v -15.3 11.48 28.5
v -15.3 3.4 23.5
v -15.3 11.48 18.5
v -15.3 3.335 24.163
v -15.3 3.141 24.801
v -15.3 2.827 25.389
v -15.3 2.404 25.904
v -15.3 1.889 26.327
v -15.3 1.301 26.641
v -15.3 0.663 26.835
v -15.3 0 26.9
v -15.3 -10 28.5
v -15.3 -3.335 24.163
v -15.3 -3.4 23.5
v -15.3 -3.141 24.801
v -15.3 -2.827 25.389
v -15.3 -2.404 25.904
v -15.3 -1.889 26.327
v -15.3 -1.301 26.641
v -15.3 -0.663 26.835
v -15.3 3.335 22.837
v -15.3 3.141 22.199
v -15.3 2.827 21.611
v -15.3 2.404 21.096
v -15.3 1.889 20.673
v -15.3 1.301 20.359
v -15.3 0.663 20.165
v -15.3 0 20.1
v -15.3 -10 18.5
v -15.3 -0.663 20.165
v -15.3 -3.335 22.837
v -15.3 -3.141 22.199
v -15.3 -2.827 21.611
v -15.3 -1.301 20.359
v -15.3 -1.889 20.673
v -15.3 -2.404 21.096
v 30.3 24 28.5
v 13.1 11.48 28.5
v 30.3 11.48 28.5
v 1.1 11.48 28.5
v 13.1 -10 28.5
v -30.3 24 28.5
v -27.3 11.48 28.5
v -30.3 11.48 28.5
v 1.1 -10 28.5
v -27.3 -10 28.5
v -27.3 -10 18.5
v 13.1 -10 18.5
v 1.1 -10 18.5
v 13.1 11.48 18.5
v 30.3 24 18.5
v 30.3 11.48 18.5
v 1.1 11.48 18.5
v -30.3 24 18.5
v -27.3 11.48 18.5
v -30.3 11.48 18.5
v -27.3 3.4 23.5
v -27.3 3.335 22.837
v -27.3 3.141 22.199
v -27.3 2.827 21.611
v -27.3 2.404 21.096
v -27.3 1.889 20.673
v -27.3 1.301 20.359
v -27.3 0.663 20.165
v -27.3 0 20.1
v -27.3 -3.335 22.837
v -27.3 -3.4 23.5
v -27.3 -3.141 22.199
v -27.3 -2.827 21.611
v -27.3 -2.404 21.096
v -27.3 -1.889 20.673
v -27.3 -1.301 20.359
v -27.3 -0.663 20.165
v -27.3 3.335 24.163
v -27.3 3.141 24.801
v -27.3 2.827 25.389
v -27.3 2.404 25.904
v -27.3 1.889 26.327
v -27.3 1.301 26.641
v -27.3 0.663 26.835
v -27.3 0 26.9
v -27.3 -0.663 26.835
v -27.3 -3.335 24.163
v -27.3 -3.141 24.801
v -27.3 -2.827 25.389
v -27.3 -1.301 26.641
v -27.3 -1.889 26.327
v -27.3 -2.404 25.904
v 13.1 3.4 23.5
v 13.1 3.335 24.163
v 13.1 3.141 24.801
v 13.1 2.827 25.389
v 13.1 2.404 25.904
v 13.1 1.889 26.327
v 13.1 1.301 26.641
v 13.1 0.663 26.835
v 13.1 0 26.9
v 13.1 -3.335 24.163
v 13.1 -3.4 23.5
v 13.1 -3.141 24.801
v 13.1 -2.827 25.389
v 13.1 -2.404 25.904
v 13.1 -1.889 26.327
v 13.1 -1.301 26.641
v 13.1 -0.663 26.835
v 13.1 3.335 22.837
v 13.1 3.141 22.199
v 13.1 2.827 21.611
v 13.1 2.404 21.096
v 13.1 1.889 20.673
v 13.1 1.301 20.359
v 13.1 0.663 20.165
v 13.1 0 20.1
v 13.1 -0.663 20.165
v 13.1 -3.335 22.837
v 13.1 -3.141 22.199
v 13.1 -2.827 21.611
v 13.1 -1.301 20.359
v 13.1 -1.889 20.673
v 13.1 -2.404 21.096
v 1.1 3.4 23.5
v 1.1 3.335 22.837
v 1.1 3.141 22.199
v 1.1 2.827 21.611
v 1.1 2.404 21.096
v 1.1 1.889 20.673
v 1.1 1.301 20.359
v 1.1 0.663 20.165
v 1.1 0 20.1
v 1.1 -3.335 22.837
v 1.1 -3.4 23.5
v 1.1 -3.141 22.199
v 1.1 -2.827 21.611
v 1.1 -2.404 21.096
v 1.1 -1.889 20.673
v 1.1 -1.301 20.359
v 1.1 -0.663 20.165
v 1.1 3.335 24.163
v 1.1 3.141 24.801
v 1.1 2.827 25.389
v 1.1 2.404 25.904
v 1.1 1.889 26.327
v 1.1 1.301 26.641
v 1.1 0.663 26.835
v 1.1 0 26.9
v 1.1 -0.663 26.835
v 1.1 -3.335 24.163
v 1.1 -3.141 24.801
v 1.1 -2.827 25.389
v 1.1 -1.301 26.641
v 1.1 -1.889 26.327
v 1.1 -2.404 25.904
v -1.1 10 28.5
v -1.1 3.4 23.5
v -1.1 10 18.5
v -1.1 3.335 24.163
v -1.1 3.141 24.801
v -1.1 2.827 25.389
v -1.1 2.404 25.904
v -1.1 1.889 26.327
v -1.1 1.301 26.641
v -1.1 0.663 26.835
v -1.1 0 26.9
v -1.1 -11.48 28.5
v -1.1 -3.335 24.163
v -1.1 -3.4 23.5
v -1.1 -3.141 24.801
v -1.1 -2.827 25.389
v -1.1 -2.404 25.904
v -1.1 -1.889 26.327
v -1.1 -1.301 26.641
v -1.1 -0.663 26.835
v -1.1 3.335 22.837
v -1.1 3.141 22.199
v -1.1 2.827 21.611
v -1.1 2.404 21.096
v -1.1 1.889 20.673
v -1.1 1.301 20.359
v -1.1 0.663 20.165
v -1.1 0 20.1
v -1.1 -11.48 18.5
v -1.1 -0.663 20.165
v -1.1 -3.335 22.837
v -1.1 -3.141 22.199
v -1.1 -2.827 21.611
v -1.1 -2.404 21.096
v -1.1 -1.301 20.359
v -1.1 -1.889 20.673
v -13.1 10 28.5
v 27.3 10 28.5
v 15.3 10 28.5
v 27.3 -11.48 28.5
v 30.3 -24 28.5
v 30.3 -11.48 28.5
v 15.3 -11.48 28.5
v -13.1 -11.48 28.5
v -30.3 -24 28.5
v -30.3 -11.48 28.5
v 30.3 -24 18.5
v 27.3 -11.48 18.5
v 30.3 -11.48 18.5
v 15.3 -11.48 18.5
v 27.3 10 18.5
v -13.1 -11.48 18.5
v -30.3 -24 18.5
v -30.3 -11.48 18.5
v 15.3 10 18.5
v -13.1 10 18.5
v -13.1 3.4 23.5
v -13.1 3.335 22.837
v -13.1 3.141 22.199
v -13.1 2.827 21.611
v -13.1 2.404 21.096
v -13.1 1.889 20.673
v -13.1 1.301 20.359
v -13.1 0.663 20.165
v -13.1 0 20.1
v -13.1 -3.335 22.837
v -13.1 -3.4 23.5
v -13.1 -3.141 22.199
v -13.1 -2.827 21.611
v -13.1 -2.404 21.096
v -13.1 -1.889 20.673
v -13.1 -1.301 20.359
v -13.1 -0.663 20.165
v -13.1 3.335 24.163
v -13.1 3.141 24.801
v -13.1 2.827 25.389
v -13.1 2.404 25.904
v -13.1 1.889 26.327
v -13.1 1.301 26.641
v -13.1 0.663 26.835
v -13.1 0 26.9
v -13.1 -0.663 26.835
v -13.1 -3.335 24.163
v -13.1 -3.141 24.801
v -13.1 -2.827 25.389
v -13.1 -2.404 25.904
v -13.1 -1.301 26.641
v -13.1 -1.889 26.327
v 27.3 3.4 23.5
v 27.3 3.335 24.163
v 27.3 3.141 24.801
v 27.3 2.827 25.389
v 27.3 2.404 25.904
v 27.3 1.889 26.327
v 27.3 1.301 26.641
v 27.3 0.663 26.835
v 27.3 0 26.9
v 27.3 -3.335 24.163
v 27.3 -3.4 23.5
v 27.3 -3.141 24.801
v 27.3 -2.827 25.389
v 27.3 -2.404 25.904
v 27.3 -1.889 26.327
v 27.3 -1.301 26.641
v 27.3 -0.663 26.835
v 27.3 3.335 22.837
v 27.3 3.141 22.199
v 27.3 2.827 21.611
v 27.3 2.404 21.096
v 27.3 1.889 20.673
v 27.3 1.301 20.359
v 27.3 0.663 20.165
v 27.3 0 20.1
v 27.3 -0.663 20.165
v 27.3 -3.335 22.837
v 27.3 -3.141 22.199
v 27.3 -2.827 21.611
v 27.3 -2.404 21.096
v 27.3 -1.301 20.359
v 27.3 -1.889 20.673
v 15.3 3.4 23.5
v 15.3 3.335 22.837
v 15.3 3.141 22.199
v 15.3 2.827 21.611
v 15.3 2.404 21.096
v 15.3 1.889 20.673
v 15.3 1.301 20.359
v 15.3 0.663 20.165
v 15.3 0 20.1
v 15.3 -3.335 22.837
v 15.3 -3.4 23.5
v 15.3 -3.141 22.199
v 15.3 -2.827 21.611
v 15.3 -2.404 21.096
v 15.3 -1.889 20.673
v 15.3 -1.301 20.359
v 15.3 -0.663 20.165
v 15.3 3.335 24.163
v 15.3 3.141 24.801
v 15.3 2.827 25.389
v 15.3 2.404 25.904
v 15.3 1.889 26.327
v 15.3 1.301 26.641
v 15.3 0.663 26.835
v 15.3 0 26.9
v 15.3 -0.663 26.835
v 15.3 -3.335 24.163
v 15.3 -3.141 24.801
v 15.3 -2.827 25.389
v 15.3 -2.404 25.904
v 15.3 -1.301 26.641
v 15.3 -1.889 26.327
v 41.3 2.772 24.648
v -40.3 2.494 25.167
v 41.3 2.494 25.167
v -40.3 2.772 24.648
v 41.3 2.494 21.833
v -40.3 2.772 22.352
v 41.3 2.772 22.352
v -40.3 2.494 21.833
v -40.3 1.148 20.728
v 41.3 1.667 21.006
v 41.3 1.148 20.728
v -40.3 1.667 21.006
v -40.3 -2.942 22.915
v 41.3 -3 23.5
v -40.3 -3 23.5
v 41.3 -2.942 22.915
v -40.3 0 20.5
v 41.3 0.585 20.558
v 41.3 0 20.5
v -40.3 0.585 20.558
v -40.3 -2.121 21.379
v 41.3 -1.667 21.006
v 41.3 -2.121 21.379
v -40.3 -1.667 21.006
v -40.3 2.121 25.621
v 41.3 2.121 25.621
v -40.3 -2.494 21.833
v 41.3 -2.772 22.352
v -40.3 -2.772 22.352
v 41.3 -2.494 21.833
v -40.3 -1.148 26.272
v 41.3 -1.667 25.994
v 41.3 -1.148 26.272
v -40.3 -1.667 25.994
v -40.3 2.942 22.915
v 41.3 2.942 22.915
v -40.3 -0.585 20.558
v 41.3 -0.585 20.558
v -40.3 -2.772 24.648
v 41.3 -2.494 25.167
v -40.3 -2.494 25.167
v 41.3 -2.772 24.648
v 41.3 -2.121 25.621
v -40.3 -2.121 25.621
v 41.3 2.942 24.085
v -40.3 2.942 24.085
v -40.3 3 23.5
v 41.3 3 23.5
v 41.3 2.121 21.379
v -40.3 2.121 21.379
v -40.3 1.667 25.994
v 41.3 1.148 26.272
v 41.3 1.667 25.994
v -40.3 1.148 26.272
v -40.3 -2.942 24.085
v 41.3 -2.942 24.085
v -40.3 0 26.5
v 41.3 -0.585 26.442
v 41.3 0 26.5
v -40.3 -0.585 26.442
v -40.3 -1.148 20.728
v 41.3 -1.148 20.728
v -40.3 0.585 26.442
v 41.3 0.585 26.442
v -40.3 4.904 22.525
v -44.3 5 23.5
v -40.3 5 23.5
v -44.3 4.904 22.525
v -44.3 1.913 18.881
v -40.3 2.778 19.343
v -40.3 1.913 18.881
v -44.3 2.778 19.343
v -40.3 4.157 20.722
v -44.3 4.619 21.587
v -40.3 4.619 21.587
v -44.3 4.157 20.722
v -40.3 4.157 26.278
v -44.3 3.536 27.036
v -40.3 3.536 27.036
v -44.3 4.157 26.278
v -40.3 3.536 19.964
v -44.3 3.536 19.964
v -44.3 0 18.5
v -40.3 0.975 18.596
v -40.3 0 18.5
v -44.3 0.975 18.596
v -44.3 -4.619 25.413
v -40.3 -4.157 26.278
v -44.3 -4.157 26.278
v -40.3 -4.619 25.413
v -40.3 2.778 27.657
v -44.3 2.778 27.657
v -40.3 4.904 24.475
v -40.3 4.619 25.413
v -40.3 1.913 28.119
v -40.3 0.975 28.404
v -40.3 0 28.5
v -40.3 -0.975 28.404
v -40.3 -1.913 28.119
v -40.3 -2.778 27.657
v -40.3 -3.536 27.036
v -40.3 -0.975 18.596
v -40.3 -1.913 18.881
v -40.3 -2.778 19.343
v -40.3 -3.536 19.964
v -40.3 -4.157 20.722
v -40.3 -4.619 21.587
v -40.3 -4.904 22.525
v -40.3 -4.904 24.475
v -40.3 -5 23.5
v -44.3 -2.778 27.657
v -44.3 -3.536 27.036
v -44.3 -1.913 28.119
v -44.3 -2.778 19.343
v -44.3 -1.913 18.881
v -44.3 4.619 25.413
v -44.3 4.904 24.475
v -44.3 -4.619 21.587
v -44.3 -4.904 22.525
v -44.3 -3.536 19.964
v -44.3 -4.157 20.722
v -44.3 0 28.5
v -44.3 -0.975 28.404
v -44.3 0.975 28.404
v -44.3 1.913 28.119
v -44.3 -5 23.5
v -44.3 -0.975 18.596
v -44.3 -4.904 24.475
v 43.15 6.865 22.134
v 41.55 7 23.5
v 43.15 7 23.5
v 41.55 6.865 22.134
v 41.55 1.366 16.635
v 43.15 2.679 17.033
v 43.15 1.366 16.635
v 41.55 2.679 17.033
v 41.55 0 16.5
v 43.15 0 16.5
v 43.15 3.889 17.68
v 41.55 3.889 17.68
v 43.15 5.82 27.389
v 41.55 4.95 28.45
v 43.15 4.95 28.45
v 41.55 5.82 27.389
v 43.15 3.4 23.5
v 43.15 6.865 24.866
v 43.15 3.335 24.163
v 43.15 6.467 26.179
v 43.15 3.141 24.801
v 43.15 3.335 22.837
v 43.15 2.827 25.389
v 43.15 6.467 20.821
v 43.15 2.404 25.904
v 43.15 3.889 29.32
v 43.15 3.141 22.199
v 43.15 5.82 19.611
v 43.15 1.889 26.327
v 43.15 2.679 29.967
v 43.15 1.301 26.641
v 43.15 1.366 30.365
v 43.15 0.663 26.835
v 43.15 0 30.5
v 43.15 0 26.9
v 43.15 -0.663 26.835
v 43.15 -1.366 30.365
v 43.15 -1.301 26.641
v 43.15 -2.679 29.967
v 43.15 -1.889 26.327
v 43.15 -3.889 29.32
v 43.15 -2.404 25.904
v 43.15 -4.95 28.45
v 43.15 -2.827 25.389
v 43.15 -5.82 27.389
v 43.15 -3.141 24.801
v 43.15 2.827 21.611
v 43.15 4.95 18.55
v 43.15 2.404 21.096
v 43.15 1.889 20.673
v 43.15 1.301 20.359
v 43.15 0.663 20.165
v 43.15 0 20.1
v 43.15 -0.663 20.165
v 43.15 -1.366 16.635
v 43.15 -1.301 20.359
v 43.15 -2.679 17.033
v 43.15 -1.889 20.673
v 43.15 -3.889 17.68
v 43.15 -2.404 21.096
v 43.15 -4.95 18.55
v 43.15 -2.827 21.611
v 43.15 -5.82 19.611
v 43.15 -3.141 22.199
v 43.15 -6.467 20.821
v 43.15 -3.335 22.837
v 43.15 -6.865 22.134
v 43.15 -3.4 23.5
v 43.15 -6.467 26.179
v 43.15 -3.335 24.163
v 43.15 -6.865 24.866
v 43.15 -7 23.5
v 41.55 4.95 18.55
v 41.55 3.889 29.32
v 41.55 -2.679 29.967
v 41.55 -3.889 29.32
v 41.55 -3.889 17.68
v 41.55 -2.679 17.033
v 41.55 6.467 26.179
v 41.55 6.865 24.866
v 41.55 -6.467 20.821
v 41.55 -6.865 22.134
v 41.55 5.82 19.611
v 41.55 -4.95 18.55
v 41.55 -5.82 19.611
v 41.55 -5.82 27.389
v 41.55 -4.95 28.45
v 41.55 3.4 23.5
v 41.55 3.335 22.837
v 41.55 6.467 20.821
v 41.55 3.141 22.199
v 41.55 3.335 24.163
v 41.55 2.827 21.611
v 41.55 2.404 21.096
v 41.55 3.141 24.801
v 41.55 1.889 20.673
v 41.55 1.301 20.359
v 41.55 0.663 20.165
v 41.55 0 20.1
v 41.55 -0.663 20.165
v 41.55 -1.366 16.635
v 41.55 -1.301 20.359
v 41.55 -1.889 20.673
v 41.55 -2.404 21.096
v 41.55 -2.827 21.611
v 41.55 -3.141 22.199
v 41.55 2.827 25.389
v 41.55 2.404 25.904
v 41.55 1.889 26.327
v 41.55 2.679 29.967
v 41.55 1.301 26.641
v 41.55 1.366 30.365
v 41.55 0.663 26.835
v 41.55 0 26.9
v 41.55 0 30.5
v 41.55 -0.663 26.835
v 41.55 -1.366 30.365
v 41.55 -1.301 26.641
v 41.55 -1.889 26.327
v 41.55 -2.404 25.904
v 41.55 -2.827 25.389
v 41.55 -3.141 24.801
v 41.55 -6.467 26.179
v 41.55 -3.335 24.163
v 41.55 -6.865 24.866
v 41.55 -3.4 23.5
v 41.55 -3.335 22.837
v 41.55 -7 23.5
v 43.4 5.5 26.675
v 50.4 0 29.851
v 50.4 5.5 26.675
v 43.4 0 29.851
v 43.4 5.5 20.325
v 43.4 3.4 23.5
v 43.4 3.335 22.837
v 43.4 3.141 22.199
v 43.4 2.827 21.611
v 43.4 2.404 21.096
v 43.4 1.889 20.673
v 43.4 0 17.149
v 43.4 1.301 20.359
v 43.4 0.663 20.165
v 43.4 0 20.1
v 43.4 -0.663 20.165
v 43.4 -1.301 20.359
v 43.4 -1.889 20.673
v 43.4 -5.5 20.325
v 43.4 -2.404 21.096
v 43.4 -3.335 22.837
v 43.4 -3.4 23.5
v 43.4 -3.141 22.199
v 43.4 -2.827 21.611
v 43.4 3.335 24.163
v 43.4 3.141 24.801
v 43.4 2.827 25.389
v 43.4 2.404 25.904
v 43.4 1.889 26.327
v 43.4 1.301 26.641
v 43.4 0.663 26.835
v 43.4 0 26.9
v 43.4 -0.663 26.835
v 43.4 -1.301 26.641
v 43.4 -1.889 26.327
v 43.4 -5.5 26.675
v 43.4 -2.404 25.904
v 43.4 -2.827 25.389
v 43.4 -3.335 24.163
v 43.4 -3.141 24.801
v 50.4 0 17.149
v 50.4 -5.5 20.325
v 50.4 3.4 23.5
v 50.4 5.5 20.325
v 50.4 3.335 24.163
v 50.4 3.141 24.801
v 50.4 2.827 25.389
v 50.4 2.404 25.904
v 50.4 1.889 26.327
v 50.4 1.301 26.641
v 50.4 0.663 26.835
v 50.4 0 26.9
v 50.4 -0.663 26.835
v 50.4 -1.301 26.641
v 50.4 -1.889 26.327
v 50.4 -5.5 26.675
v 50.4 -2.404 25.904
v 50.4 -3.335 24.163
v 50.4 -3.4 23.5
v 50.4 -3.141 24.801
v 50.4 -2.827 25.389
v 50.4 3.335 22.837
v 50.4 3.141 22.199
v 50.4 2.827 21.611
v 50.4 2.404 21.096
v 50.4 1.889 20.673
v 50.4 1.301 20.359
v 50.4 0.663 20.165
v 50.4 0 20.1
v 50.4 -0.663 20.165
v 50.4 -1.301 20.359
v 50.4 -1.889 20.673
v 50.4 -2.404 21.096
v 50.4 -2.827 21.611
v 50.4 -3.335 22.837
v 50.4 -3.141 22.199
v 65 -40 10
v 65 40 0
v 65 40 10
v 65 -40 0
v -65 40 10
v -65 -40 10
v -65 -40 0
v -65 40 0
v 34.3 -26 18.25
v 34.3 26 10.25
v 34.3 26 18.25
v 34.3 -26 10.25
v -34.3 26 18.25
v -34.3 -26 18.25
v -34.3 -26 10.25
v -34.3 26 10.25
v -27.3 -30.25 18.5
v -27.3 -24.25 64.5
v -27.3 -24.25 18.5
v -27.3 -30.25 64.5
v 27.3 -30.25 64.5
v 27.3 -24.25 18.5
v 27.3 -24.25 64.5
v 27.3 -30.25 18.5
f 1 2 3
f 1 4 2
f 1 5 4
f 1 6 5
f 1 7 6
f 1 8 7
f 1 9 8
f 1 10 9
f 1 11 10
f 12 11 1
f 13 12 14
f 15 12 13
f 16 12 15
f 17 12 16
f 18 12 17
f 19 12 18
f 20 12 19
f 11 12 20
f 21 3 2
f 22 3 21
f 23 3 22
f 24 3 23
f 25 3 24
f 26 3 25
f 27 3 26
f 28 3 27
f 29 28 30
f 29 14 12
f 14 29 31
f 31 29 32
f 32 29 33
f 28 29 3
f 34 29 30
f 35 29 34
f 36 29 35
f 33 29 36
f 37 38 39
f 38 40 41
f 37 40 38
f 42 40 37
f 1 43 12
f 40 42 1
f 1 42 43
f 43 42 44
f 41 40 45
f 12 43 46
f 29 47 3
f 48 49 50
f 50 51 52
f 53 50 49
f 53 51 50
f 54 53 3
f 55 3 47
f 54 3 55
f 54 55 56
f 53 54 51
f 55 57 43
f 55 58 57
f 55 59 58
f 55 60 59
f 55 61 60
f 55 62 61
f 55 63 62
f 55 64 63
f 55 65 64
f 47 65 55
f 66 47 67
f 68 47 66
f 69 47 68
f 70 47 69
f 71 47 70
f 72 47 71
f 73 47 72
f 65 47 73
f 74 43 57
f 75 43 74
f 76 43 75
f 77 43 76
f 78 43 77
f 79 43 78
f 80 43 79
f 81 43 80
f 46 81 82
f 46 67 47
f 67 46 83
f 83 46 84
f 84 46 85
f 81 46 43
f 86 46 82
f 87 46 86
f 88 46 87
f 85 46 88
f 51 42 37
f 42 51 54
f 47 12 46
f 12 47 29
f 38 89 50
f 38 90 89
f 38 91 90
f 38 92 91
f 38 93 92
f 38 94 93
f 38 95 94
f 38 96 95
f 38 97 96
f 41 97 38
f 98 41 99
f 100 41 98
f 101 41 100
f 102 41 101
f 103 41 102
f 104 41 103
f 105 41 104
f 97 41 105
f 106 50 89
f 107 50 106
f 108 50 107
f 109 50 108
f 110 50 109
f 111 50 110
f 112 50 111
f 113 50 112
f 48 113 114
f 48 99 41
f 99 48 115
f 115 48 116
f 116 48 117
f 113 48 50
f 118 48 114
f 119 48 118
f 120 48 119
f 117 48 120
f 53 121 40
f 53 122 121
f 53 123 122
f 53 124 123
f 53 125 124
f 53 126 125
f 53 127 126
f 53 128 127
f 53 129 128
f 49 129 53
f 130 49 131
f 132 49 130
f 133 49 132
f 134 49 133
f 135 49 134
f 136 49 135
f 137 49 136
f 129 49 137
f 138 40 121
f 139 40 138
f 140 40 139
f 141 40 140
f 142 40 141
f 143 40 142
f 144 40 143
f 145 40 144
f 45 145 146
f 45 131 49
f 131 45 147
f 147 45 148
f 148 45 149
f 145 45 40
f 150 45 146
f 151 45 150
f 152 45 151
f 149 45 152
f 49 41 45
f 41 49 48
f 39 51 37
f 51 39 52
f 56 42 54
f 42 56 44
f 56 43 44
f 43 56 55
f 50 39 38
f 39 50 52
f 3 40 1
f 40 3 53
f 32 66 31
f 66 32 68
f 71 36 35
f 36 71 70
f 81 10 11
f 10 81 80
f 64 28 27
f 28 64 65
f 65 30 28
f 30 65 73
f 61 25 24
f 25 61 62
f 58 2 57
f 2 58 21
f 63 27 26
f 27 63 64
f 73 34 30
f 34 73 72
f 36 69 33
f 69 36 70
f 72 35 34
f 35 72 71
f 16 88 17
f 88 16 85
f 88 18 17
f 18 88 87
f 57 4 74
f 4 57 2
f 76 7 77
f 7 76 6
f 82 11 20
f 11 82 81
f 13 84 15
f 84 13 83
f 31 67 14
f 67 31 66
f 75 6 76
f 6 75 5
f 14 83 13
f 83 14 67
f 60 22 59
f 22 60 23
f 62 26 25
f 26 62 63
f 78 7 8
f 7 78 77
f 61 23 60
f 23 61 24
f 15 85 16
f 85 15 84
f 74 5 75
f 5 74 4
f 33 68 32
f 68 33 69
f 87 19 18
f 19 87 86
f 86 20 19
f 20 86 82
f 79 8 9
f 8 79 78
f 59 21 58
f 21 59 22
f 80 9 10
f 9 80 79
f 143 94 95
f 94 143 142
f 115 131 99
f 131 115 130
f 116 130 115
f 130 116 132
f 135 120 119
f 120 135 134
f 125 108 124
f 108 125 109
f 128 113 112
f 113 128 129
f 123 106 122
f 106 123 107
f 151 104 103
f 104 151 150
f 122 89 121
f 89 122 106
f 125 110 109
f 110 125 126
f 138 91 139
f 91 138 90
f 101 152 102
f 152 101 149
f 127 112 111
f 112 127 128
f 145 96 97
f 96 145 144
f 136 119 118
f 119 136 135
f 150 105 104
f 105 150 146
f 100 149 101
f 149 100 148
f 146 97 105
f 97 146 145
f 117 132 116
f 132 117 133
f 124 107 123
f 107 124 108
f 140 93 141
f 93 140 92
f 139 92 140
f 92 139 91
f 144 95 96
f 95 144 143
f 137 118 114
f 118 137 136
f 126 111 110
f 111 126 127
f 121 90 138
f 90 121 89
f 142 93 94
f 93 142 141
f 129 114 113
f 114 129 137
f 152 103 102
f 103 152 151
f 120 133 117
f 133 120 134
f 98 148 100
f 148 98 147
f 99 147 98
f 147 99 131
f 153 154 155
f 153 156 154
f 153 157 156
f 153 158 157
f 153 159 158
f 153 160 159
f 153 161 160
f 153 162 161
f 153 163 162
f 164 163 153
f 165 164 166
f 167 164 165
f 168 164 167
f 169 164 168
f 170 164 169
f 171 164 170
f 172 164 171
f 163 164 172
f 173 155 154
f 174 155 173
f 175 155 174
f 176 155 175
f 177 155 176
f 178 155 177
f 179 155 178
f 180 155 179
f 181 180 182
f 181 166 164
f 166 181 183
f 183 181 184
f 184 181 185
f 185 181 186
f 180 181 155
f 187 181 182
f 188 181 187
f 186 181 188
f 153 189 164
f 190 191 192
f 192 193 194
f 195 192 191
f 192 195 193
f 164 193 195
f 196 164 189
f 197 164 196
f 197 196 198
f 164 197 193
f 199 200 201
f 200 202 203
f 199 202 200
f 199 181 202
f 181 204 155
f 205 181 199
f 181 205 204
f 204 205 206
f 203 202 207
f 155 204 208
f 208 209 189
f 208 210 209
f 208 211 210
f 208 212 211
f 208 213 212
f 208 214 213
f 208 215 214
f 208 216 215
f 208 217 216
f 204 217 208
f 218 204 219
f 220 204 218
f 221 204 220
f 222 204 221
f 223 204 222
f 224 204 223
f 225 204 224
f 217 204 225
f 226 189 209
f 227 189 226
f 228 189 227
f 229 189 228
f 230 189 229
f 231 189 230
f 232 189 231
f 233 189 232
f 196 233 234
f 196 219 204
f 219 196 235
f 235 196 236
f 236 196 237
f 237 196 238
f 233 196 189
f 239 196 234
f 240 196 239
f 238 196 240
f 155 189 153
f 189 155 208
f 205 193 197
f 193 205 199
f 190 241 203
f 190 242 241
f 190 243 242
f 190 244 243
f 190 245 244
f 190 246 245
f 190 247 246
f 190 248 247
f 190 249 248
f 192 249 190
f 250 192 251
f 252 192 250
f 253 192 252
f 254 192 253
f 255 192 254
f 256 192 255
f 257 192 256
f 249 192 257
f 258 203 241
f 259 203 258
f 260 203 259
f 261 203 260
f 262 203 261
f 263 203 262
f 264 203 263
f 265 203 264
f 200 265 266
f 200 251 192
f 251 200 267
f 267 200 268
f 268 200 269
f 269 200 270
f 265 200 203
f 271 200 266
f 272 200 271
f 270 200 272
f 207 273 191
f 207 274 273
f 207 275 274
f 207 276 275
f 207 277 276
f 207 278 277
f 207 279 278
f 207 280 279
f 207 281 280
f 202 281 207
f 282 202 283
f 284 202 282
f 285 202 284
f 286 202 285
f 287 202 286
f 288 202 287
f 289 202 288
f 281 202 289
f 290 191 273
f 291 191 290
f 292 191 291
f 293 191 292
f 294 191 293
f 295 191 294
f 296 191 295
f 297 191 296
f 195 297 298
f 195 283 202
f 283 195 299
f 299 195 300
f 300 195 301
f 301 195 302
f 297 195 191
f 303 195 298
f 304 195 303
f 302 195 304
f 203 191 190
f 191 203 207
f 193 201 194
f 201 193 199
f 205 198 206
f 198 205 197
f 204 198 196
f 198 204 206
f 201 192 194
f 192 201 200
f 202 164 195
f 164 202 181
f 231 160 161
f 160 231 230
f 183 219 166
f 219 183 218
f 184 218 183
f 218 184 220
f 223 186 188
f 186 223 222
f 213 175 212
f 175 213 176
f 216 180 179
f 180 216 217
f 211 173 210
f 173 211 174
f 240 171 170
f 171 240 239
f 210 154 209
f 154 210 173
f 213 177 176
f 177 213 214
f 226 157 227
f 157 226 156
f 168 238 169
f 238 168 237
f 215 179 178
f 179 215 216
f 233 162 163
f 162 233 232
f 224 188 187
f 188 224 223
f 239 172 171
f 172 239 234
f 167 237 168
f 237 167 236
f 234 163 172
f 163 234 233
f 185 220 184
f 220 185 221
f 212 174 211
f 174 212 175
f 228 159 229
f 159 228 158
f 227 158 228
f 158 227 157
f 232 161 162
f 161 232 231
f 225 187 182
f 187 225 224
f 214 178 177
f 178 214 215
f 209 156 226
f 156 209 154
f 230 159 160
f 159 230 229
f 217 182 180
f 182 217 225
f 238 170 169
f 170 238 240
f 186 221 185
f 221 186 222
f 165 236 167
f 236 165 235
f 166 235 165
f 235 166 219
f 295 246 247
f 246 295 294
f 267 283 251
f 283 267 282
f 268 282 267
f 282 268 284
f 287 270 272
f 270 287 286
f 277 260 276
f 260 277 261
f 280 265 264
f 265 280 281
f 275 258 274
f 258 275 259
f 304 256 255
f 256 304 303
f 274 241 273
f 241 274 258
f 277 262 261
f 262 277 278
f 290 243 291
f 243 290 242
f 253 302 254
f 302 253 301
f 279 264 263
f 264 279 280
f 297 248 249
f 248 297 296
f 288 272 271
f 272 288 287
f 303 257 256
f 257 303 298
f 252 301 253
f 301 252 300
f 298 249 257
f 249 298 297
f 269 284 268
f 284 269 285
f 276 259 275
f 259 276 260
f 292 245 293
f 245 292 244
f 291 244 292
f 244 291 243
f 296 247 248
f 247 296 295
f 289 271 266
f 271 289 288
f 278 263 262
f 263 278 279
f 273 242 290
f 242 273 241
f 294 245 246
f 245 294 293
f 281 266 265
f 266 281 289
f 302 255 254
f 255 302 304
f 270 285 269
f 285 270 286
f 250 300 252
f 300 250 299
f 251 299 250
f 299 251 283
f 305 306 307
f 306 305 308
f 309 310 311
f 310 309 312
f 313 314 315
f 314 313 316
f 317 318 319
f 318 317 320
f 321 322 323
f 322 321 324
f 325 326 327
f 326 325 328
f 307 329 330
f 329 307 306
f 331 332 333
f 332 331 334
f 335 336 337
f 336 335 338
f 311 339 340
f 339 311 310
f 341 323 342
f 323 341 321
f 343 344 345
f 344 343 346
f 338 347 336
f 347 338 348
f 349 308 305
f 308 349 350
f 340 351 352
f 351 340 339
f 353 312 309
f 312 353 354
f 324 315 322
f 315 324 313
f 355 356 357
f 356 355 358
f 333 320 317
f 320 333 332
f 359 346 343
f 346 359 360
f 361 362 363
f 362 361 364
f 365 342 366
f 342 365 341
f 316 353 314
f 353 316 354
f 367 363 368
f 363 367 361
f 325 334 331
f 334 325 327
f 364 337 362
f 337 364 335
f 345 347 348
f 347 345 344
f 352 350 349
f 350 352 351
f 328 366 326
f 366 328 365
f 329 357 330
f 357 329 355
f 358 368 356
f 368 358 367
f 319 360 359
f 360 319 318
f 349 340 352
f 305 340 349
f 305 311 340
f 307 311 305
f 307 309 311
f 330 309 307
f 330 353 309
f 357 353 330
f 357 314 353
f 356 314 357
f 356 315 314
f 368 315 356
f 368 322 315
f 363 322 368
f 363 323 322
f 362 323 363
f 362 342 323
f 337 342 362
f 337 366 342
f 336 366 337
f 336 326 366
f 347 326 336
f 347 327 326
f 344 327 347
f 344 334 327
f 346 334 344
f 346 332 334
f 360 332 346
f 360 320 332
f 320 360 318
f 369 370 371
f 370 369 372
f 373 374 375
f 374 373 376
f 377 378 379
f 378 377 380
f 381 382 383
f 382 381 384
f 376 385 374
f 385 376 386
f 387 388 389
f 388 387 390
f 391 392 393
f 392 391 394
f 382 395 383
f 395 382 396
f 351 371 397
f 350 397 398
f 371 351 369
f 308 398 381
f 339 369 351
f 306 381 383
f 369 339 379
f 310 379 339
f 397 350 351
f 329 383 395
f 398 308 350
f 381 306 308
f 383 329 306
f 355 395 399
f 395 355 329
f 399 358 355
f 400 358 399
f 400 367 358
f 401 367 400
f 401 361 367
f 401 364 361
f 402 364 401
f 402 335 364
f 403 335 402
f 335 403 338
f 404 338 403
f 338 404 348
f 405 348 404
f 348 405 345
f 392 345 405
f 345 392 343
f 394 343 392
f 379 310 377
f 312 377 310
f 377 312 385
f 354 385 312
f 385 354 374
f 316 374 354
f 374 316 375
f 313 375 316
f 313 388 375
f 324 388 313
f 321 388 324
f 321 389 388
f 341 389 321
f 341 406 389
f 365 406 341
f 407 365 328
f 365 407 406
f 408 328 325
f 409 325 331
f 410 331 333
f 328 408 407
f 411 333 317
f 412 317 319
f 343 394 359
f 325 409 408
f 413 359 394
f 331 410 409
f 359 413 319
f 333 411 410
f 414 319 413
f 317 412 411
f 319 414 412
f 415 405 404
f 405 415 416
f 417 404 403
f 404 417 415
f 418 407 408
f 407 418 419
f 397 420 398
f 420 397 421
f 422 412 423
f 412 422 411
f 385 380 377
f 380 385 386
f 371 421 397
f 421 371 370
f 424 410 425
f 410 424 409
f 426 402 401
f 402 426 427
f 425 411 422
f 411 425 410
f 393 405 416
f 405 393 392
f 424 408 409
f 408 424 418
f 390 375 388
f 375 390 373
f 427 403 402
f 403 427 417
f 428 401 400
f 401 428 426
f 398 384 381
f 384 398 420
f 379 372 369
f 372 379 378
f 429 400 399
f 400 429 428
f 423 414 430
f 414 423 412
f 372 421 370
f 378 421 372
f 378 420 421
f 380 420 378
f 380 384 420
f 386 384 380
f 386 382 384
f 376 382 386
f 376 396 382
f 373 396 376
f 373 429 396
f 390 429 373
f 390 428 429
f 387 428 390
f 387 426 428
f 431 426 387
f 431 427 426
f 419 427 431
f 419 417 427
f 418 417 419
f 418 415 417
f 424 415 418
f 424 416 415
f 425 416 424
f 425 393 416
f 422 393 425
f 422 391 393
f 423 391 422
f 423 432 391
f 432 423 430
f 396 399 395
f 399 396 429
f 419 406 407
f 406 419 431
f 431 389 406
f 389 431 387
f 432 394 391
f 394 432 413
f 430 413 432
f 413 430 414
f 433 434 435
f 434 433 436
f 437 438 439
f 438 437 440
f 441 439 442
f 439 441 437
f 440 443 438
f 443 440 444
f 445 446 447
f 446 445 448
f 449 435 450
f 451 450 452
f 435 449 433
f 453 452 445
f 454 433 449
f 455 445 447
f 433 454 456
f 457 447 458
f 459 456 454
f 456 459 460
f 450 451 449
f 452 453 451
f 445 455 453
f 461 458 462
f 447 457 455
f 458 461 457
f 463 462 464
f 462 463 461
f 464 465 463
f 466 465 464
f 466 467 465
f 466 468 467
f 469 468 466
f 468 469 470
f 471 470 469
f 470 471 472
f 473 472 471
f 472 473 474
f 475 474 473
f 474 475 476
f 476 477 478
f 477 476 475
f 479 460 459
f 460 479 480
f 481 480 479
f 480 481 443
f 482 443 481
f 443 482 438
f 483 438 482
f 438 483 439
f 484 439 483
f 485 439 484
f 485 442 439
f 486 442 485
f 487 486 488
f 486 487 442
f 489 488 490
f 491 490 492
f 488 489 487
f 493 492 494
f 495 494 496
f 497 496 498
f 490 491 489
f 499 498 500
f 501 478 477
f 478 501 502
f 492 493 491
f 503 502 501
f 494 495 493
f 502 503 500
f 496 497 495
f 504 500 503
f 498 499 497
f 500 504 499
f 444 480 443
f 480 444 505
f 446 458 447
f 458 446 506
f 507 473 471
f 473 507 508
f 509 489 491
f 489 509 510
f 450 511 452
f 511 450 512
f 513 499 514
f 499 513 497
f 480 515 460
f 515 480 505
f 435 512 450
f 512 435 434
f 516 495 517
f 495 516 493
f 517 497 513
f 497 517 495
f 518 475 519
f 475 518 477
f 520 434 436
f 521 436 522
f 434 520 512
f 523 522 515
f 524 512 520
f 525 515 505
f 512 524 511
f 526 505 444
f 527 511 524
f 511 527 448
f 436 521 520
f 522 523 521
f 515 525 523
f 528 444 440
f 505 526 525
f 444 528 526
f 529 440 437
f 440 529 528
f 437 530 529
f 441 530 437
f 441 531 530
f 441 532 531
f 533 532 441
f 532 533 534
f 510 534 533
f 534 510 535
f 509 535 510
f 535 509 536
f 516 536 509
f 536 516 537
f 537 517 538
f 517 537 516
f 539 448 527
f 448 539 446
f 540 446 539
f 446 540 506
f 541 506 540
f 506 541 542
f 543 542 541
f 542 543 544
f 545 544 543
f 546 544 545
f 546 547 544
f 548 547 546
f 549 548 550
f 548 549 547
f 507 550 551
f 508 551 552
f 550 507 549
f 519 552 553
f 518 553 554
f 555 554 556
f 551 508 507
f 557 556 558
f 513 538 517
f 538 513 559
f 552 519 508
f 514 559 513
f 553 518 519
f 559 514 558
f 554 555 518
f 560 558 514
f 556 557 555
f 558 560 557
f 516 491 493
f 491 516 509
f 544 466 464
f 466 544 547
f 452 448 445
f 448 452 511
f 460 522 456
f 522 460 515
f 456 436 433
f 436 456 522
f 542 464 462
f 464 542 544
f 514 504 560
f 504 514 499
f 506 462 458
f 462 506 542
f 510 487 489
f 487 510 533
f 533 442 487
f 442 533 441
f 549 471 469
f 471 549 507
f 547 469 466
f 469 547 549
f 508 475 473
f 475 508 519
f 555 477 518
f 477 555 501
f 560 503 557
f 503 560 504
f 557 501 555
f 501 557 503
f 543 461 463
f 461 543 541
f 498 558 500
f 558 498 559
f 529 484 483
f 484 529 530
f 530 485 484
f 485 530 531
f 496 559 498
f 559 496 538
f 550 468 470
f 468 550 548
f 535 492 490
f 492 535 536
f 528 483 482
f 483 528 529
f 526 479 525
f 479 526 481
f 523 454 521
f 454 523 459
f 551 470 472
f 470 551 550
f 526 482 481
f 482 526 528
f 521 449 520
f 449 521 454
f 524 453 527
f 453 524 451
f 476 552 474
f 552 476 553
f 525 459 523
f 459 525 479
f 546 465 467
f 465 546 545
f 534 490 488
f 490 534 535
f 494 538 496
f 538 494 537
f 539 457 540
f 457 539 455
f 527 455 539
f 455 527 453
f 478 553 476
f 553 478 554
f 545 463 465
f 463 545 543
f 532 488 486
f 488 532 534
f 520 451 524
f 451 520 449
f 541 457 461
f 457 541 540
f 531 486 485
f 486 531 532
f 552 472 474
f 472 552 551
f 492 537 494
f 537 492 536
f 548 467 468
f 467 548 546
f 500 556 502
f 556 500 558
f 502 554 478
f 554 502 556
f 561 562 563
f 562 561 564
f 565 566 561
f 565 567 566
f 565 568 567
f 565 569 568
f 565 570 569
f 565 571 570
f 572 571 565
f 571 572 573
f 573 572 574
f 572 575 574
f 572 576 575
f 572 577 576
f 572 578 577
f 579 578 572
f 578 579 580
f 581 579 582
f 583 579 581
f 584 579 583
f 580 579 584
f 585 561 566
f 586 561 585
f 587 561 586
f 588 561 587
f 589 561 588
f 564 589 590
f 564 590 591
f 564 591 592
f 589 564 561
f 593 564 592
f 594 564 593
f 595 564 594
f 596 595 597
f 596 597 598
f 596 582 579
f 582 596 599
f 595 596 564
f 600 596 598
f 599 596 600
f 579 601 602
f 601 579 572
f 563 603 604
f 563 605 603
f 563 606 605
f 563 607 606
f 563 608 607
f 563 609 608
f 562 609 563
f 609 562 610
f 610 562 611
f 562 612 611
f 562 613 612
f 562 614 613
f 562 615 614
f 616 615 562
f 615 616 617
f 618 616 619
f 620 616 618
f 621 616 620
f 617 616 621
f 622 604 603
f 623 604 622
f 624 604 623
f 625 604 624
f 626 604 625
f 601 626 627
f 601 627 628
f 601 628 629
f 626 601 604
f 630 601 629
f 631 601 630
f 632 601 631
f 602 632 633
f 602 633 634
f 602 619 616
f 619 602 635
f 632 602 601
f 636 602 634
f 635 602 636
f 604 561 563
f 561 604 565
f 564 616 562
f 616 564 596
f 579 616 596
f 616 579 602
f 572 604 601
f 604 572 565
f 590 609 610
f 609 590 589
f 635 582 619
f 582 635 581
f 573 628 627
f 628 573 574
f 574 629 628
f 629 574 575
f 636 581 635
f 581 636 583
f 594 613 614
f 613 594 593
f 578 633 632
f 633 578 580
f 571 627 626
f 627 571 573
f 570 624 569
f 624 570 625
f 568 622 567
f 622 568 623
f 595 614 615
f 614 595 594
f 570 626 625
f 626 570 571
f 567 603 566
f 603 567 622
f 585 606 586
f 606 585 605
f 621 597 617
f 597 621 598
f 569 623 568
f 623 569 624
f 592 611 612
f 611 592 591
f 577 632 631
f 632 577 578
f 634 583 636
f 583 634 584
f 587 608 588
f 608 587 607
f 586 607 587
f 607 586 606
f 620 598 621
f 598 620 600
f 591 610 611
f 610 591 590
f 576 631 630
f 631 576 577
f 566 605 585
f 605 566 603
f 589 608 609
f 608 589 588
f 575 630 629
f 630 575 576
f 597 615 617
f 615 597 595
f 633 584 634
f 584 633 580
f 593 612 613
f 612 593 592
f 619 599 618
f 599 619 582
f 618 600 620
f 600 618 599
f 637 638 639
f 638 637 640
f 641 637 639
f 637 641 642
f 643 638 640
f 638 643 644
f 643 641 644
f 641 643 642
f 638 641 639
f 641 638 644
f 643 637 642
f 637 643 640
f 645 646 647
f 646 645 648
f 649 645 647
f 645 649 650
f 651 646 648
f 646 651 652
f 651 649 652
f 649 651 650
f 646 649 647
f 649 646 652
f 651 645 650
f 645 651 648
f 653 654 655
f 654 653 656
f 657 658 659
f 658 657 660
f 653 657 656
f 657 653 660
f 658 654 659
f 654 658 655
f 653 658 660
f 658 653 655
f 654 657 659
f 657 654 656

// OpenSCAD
$fn = 32;

// ------------------------------------------------------------------------
// Comb hinge with flap: leaf 60.6 x 24 mm, pin d6, flap 46 mm
// Every part is its own module, assembly() places every instance.
// ------------------------------------------------------------------------

// --- part 1 ---
module hinge_bed() {
  difference() {
    translate([-65, -40, 0]) cube([130, 80, 10]);
  }
}

// --- part 2 ---
module hinge_riser() {
  difference() {
    translate([-34.3, -26, 0]) cube([68.6, 52, 8]);
  }
}

// --- part 3 ---
module hinge_leaf_a() {
  difference() {
    union() {
      translate([-27.3, -10, -5]) cube([12, 34, 10]);
      translate([1.1, -10, -5]) cube([12, 34, 10]);
      translate([-30.3, 11.48, -5]) cube([60.6, 12.52, 10]);
    }
    translate([-21.3, 0, 0]) rotate([0, 90, 0]) cylinder(h = 14, d = 6.8, center = true);
    translate([7.1, 0, 0]) rotate([0, 90, 0]) cylinder(h = 14, d = 6.8, center = true);
  }
}

// --- part 4 ---
module hinge_leaf_b() {
  difference() {
    union() {
      translate([-13.1, -24, -5]) cube([12, 34, 10]);
      translate([15.3, -24, -5]) cube([12, 34, 10]);
      translate([-30.3, -24, -5]) cube([60.6, 12.52, 10]);
    }
    translate([-7.1, 0, 0]) rotate([0, 90, 0]) cylinder(h = 14, d = 6.8, center = true);
    translate([21.3, 0, 0]) rotate([0, 90, 0]) cylinder(h = 14, d = 6.8, center = true);
  }
}

// --- part 5 ---
module hinge_flap() {
  difference() {
    translate([-27.3, -23, 0]) cube([54.6, 46, 6]);
  }
}

// --- part 6 ---
module hinge_pin() {
  rotate([0, 90, 0]) cylinder(h = 82.6, d = 6, center = true);
  translate([-44.3, 0, 0]) rotate([0, 90, 0]) cylinder(h = 4, d = 10);
}

// --- part 7 ---
module pin_washer() {
  difference() {
      translate([0, 0, 0]) cylinder(h = 1.6, d = 14);
      translate([0, 0, -1]) cylinder(h = 3.6, d = 6.8);
    }
}

// --- part 8 ---
module pin_nut() {
  difference() {
    linear_extrude(height = 7) polygon(points = [[6.351, 0], [3.175, 5.5], [-3.175, 5.5], [-6.351, 0], [-3.175, -5.5], [3.175, -5.5]]);
    translate([0, 0, -1]) cylinder(h = 9, d = 6.8);
  }
}

// --- assembly ---
module assembly() {
  color([0.80, 0.24, 0.20]) translate([0, 0, 0]) rotate([0, 0, 0]) hinge_bed();
  color([0.20, 0.45, 0.75]) translate([0, 0, 10.25]) rotate([0, 0, 0]) hinge_riser();
  color([0.25, 0.62, 0.32]) translate([0, 0, 23.5]) rotate([0, 0, 0]) hinge_leaf_a();
  color([0.92, 0.70, 0.18]) translate([0, 0, 23.5]) rotate([0, 0, 0]) hinge_leaf_b();
  color([0.58, 0.35, 0.70]) translate([0, -24.25, 41.5]) rotate([90, 0, 0]) hinge_flap();
  color([0.16, 0.66, 0.66]) translate([0, 0, 23.5]) rotate([0, 0, 0]) hinge_pin();
  color([0.85, 0.48, 0.18]) translate([41.55, 0, 23.5]) rotate([0, 90, 0]) pin_washer();
  color([0.55, 0.60, 0.65]) translate([43.4, 0, 23.5]) rotate([0, 90, 0]) pin_nut();
}

assembly();
